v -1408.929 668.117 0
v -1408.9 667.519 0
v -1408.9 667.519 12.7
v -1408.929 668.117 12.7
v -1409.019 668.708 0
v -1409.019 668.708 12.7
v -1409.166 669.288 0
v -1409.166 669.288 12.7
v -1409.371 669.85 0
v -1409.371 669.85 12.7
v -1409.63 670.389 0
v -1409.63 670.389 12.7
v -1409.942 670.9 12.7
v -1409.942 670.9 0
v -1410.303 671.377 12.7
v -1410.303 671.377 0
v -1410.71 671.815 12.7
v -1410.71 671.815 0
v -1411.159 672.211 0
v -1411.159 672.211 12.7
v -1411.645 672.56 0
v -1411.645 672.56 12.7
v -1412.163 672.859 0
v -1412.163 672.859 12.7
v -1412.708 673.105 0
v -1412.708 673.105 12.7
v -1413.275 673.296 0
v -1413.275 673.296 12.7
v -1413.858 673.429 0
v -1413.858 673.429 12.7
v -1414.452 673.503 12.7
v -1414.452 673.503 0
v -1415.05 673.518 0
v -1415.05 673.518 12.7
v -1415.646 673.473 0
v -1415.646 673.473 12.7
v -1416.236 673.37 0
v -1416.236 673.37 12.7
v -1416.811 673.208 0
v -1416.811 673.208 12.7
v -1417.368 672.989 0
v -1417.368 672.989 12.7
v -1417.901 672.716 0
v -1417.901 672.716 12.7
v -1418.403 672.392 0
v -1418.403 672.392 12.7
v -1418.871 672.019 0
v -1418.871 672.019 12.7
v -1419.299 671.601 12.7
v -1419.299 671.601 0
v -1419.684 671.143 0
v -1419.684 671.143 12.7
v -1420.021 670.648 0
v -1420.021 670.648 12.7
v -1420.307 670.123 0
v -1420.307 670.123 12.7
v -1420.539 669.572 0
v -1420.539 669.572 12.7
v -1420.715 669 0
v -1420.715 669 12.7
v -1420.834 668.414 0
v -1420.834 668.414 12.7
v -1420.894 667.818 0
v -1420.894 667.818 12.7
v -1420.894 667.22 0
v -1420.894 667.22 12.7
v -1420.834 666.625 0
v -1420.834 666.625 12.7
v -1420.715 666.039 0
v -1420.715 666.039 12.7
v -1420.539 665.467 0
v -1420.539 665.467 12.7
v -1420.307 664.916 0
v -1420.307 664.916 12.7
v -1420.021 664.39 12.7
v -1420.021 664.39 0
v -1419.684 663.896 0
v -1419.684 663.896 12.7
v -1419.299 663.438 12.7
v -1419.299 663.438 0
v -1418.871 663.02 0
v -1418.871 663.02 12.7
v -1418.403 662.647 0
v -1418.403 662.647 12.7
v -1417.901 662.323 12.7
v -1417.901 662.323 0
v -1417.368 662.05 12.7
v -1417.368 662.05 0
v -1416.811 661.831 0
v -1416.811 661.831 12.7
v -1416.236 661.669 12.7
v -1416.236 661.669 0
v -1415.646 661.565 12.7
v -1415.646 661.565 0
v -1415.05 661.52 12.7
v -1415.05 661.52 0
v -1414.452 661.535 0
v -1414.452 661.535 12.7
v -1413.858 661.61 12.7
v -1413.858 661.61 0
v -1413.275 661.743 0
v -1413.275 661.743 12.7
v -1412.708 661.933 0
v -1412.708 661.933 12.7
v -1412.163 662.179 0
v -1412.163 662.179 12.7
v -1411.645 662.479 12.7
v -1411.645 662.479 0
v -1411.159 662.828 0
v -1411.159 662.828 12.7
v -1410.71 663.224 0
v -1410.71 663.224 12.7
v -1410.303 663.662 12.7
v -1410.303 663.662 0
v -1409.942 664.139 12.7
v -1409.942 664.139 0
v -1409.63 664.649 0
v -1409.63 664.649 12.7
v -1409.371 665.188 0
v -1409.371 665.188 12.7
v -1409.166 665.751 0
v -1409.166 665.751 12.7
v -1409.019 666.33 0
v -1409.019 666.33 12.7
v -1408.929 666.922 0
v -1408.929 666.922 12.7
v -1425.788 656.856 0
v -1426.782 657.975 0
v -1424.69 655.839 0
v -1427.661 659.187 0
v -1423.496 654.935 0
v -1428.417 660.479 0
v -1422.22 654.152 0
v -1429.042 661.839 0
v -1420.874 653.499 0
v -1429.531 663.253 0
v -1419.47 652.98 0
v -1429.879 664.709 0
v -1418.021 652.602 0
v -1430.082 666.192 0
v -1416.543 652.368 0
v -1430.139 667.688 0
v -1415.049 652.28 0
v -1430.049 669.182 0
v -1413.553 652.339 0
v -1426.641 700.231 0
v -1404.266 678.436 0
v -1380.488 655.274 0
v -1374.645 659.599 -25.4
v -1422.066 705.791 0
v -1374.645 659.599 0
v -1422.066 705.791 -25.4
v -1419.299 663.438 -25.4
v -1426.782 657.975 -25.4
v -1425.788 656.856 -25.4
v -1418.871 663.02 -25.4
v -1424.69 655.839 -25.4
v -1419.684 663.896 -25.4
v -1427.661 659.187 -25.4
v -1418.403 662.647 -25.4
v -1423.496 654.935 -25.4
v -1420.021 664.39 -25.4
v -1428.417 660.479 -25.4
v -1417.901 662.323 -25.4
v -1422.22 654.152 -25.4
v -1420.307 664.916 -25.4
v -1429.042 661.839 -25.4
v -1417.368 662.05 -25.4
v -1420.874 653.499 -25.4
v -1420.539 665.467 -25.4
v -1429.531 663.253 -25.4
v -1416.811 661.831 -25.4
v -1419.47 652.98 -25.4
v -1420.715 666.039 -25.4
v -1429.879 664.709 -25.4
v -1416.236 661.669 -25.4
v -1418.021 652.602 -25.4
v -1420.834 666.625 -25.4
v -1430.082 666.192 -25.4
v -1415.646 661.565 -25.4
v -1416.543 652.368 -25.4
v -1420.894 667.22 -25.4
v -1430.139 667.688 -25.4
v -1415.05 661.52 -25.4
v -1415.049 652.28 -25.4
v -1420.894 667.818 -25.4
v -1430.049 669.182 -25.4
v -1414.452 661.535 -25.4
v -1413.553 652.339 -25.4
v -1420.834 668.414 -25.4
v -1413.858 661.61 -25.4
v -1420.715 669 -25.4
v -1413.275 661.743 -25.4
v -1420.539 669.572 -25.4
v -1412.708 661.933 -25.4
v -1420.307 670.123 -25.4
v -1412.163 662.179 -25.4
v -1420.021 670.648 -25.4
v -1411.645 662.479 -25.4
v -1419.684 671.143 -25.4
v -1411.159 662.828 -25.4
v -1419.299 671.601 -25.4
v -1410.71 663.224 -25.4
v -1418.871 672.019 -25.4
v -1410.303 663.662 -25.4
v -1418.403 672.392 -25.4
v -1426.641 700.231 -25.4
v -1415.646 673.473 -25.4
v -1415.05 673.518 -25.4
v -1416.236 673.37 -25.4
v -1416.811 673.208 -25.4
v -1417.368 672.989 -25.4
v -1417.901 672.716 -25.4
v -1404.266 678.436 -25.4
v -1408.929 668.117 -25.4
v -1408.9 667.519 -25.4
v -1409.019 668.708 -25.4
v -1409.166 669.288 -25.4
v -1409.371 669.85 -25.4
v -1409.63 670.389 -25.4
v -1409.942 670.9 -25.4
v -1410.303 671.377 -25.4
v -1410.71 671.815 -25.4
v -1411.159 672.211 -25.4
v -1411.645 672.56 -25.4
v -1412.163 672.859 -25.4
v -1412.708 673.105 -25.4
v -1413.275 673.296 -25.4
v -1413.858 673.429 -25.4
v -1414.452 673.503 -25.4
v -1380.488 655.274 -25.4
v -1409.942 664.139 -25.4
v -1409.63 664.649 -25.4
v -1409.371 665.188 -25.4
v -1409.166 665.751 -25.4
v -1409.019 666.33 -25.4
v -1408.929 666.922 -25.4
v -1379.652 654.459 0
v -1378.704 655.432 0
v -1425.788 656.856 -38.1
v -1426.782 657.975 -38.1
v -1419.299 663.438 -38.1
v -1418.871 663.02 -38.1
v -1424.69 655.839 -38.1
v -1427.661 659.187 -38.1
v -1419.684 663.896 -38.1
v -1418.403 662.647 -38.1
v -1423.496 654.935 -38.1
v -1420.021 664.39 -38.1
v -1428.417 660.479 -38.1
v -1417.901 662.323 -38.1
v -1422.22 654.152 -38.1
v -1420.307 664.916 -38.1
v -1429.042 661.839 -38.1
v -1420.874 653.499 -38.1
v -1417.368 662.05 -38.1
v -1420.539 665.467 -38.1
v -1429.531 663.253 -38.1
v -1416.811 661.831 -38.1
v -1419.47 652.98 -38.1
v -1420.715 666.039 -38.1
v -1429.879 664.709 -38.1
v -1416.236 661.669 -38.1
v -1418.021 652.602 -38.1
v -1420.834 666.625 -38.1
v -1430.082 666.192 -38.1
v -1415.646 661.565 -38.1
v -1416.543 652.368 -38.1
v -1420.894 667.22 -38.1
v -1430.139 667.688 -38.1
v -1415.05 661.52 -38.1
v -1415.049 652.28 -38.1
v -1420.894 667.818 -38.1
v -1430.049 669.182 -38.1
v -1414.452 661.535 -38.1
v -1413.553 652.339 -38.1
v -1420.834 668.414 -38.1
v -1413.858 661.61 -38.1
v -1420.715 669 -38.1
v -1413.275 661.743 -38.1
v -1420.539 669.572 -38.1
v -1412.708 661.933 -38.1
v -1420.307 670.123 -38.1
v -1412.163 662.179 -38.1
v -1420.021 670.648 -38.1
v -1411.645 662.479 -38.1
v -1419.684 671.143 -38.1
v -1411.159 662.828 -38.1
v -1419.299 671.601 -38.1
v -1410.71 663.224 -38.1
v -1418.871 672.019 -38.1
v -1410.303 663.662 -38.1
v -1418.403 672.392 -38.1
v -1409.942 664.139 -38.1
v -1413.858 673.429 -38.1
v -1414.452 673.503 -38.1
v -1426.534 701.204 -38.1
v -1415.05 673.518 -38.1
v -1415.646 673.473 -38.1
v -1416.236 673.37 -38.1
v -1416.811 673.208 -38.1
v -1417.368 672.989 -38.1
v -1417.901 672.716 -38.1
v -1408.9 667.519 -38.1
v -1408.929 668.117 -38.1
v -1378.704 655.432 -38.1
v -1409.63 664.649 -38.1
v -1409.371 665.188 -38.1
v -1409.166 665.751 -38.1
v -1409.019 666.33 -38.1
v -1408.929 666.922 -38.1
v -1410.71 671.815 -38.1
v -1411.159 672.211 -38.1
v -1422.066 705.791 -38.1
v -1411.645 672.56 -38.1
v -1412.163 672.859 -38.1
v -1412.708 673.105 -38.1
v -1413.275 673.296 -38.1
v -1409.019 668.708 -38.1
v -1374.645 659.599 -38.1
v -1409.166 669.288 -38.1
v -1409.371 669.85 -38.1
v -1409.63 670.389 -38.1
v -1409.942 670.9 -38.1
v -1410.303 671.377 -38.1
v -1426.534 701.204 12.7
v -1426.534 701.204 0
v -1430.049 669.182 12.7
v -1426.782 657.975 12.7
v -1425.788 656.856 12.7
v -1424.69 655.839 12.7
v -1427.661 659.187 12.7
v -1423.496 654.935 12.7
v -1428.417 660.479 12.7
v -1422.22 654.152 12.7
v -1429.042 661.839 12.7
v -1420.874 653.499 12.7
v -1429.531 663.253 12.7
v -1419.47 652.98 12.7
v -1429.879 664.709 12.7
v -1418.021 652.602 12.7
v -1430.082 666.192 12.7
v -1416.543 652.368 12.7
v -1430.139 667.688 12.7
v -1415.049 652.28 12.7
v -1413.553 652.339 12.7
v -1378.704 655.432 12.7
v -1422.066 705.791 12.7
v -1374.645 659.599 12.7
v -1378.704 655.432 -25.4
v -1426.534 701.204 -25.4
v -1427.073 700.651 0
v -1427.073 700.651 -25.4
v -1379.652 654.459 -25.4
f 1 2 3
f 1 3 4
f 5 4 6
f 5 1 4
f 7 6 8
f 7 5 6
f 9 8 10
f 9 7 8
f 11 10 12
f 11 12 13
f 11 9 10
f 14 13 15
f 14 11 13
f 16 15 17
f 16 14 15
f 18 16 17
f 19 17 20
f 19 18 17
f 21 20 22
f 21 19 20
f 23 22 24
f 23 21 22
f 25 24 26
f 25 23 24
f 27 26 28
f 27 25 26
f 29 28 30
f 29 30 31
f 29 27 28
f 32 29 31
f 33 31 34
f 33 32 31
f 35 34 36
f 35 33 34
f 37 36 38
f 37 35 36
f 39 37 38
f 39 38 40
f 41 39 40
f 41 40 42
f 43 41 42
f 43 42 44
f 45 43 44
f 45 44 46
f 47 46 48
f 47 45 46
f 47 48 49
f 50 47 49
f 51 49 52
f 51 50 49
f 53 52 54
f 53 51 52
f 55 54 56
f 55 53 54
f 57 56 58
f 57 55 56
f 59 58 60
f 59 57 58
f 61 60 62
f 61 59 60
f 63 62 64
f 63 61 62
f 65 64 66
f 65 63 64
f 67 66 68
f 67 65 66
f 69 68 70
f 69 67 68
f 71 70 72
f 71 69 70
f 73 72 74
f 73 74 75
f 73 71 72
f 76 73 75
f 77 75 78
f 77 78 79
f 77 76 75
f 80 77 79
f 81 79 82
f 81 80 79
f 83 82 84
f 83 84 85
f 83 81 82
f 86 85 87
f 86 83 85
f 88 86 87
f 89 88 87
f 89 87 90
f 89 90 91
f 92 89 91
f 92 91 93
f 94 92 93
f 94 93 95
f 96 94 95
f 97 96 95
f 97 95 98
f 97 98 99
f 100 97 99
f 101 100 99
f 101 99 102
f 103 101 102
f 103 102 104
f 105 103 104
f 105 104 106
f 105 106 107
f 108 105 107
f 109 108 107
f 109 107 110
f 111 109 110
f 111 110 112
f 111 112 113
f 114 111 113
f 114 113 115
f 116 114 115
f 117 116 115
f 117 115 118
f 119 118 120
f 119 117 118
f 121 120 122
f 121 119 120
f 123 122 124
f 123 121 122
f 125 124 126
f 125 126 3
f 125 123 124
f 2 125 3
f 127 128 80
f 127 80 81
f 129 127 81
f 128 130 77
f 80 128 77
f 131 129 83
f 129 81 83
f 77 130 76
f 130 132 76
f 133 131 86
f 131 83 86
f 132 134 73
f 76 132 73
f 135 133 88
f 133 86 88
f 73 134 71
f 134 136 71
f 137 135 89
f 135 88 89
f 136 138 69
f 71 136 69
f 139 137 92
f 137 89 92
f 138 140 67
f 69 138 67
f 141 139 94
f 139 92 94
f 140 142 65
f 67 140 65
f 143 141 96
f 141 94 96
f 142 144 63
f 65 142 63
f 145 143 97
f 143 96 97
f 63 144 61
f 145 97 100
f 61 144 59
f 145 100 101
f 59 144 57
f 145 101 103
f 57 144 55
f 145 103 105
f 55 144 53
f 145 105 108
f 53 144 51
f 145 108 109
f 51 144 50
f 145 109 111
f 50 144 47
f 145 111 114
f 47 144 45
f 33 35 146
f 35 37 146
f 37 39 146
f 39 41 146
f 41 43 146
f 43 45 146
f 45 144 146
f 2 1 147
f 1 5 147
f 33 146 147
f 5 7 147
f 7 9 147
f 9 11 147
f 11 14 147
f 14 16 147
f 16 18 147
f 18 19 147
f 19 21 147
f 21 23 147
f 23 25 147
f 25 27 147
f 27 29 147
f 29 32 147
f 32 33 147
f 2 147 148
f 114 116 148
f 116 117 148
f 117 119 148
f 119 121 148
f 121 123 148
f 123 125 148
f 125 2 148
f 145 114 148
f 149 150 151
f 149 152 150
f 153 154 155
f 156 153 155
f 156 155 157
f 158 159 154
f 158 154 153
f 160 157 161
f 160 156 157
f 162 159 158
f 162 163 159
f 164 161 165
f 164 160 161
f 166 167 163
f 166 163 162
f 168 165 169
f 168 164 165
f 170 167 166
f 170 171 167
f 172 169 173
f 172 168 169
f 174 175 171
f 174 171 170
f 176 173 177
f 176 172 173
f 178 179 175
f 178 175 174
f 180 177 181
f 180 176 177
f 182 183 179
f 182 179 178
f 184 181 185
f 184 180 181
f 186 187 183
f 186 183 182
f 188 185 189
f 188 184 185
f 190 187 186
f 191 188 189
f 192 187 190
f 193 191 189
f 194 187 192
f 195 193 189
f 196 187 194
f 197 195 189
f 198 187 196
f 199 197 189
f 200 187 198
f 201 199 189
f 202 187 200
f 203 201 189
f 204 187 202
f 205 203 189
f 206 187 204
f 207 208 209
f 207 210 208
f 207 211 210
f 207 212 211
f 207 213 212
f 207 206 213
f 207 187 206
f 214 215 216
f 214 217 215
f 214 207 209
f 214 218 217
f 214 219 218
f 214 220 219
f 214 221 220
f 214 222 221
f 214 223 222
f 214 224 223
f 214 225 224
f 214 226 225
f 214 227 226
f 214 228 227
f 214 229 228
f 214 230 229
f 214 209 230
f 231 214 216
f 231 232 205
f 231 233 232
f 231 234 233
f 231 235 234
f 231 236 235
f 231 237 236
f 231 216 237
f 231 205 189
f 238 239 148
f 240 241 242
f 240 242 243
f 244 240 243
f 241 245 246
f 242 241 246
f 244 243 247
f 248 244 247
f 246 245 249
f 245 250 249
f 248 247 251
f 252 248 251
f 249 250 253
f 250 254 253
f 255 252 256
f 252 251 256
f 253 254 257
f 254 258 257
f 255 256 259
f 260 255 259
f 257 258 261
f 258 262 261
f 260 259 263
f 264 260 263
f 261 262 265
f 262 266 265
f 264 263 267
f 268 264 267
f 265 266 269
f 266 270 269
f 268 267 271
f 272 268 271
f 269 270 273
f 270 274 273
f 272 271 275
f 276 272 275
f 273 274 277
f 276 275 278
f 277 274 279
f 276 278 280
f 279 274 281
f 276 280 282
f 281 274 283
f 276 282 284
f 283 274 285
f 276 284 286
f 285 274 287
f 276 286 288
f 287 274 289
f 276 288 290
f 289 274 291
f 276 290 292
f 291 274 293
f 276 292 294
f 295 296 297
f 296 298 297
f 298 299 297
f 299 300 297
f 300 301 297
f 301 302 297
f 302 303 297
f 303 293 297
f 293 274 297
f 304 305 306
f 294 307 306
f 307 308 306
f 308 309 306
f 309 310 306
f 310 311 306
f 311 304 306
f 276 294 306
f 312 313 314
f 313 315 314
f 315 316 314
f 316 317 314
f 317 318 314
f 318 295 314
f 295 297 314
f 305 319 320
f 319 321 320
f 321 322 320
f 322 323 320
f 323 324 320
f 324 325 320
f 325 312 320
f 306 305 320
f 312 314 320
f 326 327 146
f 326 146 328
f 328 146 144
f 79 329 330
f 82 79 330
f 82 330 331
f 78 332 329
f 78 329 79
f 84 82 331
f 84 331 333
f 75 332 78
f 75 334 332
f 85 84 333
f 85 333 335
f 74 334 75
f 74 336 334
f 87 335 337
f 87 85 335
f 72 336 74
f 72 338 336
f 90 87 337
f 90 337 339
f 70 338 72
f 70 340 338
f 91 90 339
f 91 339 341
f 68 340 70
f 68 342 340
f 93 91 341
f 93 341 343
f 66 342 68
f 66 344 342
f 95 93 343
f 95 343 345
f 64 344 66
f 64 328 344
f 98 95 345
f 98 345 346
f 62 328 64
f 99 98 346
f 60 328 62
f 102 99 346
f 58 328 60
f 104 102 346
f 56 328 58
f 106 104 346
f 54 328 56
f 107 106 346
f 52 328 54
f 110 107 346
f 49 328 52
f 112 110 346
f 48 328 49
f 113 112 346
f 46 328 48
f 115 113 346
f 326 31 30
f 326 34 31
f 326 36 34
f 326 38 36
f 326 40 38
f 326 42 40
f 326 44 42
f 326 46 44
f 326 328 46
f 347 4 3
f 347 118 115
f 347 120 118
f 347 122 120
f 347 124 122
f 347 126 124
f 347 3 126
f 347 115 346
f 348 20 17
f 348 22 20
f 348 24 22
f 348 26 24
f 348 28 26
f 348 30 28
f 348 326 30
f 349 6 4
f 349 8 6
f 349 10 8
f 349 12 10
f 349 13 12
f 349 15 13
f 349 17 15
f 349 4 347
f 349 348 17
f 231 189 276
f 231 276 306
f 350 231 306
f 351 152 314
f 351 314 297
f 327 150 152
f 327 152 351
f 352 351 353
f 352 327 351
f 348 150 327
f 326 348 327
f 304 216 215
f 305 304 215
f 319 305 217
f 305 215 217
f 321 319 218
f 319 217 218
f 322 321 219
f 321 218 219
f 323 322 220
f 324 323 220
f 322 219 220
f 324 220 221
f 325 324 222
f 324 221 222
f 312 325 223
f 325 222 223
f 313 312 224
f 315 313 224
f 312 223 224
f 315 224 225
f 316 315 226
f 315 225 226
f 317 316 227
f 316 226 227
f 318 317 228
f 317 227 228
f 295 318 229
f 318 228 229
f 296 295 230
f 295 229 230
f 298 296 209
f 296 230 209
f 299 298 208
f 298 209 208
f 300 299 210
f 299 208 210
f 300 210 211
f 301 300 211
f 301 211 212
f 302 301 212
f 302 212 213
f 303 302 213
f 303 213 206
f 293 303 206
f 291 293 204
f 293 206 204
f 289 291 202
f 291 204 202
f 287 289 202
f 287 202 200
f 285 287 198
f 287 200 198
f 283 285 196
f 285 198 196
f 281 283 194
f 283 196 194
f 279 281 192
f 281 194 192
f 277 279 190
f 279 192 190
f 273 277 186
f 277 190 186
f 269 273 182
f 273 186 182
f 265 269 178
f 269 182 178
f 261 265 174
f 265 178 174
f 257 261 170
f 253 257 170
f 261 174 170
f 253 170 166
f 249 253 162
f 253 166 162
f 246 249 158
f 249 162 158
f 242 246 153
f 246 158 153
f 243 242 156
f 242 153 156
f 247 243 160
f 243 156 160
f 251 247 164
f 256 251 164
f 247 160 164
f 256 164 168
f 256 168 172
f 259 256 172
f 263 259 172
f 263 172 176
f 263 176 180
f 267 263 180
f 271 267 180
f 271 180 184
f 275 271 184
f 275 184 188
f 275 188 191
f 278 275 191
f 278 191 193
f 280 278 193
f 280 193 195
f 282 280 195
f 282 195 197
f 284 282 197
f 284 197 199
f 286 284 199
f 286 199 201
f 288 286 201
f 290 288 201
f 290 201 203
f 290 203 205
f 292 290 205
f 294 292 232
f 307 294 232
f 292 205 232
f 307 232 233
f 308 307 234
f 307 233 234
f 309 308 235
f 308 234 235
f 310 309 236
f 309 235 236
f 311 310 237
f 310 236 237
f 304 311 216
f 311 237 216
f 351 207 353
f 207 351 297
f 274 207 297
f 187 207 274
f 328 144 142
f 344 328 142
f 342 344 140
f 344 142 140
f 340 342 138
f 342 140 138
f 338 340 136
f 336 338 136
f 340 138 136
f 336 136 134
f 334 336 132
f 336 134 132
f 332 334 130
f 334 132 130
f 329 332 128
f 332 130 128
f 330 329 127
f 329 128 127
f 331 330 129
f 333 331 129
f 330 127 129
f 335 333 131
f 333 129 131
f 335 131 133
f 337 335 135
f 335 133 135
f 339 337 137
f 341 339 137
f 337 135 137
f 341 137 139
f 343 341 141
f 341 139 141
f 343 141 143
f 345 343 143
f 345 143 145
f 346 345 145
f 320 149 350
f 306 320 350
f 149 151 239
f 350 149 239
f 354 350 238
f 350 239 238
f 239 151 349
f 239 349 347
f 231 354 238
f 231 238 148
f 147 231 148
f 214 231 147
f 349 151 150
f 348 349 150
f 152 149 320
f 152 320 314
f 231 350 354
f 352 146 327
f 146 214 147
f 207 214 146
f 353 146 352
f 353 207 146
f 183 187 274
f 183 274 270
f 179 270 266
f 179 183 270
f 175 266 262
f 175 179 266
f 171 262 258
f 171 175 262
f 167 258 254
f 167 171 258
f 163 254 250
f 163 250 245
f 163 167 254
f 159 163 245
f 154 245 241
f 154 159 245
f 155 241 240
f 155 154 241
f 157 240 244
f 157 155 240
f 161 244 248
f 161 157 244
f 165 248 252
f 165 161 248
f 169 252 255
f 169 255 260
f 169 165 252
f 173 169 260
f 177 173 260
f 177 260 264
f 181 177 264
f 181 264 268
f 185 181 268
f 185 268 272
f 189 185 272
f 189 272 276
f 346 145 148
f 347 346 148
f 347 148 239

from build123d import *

# Parameters (mm, degrees)
SKETCH1_R               = 6.00075
BOSS_EXTRUDE1_DEPTH     = 12.7
BOSS_EXTRUDE2_DEPTH     = 12.7
CUT_EXTRUDE1_DEPTH      = 26.4
CUT_EXTRUDE1_DEPTH_BACK = 26.4


with BuildPart() as part:
    # Sketch1 → Boss-Extrude1 (new body)
    with BuildSketch(Plane.XY):
        with BuildLine():
            Line((-1425.647832194, 709.279769852), (-1430.049287856, 669.182201206))
            ThreePointArc((-1430.049287856, 669.182201206), (-1425.788130872, 656.855717211), (-1413.552984482, 652.338986166))
            Line((-1413.552984482, 652.338986166), (-1371.063789142, 656.110020516))
            Line((-1371.063789142, 656.110020516), (-1425.647832194, 709.279769852))
        make_face()
        with Locations((-1414.900280944, 667.519315288)):
            Circle(SKETCH1_R, mode=Mode.SUBTRACT)
        with BuildLine():
            ThreePointArc((-1399.660280943, 667.519315289), (-1414.06759413, 682.736550014), (-1430.049287856, 669.182201206))
            ThreePointArc((-1430.049287856, 669.182201206), (-1429.244352574, 662.370994293), (-1425.534230405, 656.602506283))
            ThreePointArc((-1425.534230405, 656.602506283), (-1420.009574625, 653.161295993), (-1413.552984482, 652.338986166))
            ThreePointArc((-1413.552984482, 652.338986167), (-1403.657719001, 657.230369718), (-1399.660280943, 667.519315289))
        make_face()
        with Locations((-1414.900280944, 667.519315288)):
            Circle(SKETCH1_R, mode=Mode.SUBTRACT)
    boss_extrude1 = extrude(amount=BOSS_EXTRUDE1_DEPTH)

    # Sketch2 → Boss-Extrude2 (add, symmetric)
    with BuildSketch(Plane(origin=(0, 0, -12.7), x_dir=(-1, 0, 0), z_dir=(0, 0, -1))):
        Polygon((1422.066202071, 705.790941154), (1374.645419263, 659.598849213), (1379.65176797, 654.459333665), (1404.266329264, 678.436122134), (1427.072550778, 700.651425607), align=None)
    extrude(amount=BOSS_EXTRUDE2_DEPTH, both=True)

    # Mirror2: Boss-Extrude1 across plane
    add(boss_extrude1.mirror(Plane(origin=(0, 0, -12.7), x_dir=(1, 0, 0), z_dir=(0, 0, -1))))

    # Sketch4 → Cut-Extrude1 (cut, two sides)
    with BuildSketch(Plane(origin=(0, 0, -12.7), x_dir=(-1, 0, 0), z_dir=(0, 0, -1))) as cut_extrude1_sk:
        Polygon((1376.070137849, 650.970504969), (1371.063789142, 656.110020516), (1374.645419263, 659.598849213), (1379.65176797, 654.459333665), align=None)
        Polygon((1427.072550778, 700.651425607), (1430.654180901, 704.140254305), (1425.647832194, 709.279769852), (1422.066202071, 705.790941154), align=None)
    extrude(amount=CUT_EXTRUDE1_DEPTH, mode=Mode.SUBTRACT)
    extrude(cut_extrude1_sk.sketch, amount=-CUT_EXTRUDE1_DEPTH_BACK, mode=Mode.SUBTRACT)


solid = part.part
